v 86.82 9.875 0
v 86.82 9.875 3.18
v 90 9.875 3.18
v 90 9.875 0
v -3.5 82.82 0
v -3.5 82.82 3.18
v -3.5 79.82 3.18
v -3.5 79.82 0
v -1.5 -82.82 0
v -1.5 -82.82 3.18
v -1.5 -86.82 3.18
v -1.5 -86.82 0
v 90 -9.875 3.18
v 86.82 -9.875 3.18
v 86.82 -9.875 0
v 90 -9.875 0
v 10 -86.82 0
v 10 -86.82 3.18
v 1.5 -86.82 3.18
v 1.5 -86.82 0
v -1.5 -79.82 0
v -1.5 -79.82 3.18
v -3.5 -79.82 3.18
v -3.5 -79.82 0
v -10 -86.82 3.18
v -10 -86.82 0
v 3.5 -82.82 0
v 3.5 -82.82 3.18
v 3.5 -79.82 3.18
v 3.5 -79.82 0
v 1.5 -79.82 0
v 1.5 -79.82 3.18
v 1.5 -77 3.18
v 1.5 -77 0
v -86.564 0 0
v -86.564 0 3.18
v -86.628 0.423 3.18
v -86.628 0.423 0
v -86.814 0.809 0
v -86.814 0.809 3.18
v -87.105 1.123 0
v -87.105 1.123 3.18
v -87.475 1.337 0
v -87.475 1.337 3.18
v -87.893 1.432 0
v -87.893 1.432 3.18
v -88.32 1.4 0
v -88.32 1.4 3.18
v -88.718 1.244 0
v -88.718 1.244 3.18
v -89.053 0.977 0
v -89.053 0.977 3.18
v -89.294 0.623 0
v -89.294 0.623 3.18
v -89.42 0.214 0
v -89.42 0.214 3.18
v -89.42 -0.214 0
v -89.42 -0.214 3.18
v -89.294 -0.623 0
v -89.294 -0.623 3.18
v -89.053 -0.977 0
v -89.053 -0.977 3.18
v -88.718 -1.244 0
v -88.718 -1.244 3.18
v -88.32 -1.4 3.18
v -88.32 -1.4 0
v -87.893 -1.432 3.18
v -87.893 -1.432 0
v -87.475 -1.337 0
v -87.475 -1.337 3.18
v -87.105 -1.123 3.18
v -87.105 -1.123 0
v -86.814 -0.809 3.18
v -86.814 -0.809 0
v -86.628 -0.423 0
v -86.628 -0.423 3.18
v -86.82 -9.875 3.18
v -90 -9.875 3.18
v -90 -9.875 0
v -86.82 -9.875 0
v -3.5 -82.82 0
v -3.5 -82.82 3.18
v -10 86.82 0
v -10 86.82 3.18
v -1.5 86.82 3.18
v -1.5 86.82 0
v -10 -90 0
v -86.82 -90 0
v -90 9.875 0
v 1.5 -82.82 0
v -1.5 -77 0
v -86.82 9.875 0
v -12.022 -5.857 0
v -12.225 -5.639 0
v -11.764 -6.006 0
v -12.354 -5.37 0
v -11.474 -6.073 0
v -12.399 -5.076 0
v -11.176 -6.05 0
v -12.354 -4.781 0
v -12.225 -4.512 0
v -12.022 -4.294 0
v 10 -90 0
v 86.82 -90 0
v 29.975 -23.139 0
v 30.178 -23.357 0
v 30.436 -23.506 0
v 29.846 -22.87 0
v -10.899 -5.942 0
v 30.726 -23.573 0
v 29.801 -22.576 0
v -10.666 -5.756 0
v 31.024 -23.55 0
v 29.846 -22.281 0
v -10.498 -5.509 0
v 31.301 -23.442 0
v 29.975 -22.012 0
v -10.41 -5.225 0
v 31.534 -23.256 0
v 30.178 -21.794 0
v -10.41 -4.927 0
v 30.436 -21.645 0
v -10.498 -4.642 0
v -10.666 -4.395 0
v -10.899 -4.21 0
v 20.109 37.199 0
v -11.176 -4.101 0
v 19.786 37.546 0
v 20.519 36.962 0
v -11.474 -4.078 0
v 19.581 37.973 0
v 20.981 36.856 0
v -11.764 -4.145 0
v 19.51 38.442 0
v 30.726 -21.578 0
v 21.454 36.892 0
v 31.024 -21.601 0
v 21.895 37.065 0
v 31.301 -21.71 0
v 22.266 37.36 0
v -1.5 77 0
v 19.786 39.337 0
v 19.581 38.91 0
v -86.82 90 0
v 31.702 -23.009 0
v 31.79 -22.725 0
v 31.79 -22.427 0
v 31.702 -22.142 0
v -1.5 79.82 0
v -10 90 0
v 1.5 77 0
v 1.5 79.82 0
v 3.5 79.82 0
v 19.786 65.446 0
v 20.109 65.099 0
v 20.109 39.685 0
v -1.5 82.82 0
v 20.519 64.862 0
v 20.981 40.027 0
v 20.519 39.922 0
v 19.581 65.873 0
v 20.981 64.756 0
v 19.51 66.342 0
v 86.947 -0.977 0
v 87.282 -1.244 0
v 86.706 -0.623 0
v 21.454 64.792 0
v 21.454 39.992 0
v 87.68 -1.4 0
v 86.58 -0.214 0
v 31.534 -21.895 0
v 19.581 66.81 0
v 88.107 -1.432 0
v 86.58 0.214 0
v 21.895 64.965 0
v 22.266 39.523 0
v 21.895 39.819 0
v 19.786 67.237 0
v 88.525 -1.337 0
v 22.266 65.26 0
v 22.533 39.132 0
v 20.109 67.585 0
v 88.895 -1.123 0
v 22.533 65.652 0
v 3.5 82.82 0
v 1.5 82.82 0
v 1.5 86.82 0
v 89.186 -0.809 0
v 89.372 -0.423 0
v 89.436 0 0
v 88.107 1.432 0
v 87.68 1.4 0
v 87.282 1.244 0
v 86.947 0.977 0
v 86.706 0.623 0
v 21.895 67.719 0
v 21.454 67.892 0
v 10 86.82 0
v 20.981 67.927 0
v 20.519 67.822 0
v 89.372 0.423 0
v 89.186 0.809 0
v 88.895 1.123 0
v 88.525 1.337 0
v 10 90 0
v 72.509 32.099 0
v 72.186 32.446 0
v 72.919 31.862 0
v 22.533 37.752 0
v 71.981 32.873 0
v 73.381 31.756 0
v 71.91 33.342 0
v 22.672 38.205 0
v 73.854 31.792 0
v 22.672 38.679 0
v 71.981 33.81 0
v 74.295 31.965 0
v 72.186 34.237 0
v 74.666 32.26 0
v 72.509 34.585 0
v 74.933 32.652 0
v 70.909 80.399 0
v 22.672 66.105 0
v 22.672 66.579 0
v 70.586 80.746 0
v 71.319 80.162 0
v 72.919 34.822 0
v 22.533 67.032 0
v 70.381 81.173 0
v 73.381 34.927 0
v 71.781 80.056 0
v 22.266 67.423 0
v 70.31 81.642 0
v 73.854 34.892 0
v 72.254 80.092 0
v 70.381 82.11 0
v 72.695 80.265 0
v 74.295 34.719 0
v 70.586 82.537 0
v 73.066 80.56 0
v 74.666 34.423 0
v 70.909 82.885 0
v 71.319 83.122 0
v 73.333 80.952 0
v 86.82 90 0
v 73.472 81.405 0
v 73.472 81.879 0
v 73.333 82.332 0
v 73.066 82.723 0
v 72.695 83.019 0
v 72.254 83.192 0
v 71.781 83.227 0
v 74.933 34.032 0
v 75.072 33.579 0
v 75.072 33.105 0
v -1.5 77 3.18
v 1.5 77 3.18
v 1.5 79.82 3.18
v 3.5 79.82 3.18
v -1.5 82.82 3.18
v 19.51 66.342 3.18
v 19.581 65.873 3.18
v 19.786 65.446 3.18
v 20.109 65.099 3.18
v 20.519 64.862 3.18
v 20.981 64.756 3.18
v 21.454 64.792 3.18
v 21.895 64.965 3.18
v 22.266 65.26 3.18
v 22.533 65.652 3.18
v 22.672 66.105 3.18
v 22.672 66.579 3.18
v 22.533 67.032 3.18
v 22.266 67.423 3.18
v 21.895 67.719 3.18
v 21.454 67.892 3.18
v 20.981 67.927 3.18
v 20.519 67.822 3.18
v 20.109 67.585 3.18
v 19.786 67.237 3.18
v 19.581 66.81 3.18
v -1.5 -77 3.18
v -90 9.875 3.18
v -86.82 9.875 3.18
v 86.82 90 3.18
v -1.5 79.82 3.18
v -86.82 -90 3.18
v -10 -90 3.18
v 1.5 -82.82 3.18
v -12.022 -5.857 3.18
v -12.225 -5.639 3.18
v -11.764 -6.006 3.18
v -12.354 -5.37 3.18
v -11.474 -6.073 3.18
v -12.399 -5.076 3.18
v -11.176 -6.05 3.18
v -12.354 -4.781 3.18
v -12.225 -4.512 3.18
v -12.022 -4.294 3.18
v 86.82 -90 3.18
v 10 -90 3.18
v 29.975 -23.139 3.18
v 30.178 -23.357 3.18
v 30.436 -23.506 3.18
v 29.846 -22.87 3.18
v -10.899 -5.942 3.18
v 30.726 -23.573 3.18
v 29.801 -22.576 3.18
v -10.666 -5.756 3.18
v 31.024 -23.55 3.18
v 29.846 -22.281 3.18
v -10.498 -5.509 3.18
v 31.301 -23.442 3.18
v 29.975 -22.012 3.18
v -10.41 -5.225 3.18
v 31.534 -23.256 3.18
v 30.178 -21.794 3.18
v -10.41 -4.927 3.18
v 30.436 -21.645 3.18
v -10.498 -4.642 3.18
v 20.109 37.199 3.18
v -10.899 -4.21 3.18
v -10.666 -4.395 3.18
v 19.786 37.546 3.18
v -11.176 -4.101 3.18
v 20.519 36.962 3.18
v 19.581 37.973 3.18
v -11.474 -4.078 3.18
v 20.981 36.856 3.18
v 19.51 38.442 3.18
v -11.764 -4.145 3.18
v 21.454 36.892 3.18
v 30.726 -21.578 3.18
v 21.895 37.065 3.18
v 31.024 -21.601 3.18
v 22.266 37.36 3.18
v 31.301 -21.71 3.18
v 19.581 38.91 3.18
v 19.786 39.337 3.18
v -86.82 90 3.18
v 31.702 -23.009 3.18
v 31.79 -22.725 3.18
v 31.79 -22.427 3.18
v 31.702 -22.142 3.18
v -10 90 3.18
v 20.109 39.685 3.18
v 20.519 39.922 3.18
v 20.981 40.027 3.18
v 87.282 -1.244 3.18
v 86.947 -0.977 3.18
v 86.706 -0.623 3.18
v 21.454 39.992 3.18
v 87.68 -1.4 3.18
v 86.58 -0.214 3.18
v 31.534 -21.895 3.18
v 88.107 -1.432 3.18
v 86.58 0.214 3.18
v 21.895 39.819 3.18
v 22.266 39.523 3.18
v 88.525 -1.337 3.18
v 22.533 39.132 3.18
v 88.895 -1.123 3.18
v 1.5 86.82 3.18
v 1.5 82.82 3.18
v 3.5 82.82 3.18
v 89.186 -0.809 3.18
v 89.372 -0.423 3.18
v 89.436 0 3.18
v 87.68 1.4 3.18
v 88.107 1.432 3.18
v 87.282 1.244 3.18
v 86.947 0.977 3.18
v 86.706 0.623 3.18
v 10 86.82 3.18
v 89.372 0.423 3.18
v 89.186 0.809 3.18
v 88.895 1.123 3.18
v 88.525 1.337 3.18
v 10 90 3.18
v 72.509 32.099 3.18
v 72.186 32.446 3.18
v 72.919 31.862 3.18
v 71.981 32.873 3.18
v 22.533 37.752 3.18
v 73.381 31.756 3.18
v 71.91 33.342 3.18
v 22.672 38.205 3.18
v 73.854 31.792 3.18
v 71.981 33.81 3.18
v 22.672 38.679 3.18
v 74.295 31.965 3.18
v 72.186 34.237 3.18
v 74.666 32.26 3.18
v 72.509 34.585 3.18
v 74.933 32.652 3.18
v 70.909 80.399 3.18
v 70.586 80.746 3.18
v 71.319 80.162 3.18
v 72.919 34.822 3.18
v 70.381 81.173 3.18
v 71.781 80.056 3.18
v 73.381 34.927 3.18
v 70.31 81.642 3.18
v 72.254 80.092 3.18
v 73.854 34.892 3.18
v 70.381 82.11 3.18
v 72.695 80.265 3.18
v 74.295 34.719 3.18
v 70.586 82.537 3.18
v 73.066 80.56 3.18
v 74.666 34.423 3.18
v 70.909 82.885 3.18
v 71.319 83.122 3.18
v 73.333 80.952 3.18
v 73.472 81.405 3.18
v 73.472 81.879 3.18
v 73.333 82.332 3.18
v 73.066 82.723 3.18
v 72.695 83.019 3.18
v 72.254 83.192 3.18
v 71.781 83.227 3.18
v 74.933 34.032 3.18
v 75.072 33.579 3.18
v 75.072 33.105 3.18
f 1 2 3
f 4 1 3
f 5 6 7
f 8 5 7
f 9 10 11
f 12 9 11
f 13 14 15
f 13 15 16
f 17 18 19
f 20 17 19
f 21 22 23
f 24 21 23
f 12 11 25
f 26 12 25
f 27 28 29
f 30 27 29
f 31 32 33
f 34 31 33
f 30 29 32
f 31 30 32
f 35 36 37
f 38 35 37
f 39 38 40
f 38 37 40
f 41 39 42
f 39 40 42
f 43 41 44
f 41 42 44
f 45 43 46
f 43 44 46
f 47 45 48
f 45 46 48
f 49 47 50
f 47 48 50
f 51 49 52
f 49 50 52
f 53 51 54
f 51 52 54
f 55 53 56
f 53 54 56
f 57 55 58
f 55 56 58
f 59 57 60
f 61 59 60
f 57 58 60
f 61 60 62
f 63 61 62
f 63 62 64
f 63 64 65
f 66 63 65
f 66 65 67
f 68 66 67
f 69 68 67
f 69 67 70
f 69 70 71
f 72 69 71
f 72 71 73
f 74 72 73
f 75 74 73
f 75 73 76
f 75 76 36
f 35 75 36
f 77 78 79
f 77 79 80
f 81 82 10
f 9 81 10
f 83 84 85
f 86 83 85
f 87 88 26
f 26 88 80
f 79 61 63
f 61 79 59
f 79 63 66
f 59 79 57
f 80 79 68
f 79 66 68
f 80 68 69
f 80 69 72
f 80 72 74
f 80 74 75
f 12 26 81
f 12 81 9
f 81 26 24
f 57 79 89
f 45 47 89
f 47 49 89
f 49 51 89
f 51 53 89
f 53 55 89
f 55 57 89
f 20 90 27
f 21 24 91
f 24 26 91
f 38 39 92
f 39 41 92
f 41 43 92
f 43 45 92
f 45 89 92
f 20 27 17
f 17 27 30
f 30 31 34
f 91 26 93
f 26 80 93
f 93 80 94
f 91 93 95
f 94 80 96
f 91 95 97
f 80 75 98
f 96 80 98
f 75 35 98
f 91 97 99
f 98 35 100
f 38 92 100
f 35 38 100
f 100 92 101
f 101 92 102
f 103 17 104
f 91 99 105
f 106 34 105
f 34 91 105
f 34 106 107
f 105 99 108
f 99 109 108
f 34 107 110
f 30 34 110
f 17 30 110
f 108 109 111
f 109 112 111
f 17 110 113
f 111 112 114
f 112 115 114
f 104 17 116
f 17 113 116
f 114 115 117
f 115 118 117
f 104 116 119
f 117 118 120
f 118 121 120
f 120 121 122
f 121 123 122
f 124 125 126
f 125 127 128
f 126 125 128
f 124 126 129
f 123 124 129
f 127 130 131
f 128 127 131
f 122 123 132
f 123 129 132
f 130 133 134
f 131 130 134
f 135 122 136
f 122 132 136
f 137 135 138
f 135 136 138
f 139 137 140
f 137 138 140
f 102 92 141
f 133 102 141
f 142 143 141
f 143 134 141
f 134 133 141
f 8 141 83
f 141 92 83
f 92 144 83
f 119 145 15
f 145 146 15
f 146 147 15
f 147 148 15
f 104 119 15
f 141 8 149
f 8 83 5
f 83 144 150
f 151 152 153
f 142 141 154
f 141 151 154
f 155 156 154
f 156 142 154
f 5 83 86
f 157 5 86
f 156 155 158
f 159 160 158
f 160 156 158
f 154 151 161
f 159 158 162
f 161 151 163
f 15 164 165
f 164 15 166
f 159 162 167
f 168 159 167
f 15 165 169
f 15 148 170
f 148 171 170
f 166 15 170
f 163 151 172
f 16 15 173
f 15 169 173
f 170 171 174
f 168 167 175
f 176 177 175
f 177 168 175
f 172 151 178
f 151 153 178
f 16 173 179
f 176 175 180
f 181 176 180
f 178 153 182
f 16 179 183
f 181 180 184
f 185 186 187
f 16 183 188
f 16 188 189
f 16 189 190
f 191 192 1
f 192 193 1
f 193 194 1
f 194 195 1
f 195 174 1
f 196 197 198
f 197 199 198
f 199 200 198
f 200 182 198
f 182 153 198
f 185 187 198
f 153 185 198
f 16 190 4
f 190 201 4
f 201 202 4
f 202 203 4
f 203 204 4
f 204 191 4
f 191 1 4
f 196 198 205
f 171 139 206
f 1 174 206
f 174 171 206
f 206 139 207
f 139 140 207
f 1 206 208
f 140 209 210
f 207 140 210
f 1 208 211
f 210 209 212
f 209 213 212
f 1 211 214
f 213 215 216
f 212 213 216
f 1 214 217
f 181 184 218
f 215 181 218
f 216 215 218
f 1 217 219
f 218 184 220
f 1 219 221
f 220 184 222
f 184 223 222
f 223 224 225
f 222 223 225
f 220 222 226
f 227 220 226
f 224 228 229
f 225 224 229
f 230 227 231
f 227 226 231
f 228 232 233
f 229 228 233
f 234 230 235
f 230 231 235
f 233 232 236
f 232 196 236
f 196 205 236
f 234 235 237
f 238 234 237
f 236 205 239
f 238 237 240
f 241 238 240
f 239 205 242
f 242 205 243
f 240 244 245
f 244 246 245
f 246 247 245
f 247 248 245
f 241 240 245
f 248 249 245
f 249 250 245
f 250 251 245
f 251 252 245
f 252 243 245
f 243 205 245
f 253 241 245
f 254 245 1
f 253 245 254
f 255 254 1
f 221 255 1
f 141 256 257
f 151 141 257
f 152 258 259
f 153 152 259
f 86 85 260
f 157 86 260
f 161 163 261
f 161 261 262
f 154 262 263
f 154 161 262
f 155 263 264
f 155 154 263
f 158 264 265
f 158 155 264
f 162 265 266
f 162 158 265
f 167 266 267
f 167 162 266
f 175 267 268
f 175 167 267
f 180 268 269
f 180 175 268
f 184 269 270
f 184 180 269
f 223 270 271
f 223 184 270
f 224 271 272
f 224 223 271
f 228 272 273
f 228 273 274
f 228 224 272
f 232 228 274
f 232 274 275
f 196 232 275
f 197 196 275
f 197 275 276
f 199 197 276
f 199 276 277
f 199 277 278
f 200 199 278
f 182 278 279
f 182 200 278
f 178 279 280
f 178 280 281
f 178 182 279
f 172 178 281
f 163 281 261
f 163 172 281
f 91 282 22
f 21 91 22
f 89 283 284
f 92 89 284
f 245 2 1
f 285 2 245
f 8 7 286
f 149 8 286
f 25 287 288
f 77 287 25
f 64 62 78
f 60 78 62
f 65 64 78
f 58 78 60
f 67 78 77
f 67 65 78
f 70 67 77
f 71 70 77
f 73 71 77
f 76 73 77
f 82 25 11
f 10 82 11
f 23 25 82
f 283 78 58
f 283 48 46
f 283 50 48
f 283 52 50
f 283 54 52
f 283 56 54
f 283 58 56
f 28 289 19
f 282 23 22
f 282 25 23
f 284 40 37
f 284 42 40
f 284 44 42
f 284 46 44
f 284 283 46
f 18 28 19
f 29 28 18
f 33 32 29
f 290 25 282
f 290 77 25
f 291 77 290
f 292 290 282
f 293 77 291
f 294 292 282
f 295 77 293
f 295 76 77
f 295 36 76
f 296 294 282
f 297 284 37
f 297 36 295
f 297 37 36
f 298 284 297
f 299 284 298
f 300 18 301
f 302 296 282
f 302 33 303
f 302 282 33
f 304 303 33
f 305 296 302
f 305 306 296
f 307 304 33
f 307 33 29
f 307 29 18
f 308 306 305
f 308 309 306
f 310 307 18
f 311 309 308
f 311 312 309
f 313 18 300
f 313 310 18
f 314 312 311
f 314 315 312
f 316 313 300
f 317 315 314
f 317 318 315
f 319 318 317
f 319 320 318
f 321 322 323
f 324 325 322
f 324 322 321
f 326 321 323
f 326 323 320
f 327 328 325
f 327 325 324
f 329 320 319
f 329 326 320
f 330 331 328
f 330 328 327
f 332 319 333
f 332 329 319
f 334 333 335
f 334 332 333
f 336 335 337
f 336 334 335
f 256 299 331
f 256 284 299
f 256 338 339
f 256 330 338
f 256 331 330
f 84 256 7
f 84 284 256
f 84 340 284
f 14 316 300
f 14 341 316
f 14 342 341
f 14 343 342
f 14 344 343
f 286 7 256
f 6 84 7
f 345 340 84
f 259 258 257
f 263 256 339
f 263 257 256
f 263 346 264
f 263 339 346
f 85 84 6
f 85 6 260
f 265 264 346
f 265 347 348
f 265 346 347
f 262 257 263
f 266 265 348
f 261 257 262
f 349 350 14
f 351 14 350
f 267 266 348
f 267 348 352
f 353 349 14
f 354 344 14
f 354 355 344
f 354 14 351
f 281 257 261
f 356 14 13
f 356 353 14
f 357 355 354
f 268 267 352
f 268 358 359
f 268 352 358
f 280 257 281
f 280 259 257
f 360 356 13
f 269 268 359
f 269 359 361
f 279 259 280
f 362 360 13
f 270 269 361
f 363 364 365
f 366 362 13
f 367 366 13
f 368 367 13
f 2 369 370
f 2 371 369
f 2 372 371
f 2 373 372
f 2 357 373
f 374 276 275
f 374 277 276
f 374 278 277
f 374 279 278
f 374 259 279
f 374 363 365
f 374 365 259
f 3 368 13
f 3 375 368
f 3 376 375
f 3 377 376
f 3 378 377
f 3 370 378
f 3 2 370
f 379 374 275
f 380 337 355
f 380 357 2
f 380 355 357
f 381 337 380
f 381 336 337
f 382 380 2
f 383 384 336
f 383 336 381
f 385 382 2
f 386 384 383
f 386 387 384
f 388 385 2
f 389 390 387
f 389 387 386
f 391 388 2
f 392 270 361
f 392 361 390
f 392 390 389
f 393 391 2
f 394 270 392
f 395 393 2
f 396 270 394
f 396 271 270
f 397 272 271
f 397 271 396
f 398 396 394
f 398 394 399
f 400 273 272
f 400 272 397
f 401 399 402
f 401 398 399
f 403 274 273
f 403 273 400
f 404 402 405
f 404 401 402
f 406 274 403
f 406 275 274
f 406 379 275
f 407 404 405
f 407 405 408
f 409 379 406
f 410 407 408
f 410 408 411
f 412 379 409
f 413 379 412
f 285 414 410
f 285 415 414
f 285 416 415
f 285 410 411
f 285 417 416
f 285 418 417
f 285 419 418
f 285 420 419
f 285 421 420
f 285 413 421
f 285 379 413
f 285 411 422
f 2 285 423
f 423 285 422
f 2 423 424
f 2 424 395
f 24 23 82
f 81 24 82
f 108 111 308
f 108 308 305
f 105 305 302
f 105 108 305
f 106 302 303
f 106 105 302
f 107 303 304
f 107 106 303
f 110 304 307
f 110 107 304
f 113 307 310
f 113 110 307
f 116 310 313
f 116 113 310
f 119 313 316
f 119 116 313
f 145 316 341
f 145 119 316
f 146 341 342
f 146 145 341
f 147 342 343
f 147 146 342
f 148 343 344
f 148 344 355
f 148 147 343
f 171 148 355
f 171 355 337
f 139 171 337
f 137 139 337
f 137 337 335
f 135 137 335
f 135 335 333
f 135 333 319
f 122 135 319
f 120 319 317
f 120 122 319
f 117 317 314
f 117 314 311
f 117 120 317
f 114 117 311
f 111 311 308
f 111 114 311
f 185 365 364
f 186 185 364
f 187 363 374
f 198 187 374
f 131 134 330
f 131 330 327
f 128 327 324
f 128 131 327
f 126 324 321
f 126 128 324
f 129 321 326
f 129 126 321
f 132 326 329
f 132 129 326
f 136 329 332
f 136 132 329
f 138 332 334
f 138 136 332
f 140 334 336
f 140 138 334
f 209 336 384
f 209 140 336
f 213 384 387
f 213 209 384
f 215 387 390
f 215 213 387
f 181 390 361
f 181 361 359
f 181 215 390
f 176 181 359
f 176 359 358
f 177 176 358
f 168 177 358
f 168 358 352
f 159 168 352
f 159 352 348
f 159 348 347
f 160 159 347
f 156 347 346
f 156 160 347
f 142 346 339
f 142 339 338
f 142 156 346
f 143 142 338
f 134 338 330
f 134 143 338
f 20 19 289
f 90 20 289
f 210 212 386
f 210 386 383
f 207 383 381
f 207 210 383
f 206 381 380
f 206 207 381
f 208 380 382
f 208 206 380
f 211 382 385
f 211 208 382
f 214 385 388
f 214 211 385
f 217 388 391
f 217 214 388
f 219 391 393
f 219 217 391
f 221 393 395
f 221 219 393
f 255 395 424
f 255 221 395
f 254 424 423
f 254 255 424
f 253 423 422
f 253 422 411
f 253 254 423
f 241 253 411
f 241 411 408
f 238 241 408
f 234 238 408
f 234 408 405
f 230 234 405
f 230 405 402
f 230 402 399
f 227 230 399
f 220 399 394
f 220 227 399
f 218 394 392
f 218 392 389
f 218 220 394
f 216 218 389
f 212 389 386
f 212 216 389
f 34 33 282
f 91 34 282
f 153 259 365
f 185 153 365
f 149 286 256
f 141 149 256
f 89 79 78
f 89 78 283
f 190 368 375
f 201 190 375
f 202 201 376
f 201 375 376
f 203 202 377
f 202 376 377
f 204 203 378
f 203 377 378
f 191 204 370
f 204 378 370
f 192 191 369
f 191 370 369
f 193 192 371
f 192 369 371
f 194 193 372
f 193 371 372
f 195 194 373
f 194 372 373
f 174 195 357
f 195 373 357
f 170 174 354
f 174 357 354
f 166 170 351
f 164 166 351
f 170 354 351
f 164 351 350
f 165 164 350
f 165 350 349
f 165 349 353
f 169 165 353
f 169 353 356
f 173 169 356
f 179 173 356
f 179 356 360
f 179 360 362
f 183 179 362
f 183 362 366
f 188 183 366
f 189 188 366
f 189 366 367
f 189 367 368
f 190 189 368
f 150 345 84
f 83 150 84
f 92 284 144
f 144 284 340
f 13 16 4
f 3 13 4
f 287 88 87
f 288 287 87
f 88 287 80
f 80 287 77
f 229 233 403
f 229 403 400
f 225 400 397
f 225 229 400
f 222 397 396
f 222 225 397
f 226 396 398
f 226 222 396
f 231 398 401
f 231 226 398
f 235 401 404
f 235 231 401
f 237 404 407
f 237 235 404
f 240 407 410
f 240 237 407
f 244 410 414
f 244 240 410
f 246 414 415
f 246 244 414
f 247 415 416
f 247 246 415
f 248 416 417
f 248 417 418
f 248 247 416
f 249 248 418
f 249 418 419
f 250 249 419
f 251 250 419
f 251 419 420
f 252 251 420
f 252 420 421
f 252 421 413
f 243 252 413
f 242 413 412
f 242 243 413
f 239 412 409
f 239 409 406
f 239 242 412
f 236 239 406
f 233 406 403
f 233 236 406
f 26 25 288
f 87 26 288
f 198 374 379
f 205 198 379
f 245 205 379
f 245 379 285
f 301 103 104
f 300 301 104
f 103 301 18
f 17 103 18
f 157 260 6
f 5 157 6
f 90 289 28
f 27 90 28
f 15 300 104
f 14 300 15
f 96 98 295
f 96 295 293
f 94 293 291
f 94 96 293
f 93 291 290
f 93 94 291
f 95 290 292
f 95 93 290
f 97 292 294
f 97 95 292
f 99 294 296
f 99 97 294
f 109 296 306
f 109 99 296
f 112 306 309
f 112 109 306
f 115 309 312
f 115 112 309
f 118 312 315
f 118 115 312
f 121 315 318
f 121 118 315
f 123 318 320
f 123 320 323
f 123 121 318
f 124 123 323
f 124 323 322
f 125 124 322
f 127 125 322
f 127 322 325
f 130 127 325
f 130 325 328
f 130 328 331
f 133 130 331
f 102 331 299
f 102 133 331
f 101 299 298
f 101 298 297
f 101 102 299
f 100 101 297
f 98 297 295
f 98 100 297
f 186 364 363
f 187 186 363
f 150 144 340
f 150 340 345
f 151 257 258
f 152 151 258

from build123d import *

# Parameters (mm, degrees)
SKETCH3_W           = 180
SKETCH3_H           = 180
SKETCH3_R           = 1
SKETCH3_R_2         = 1.59
BOSS_EXTRUDE1_DEPTH = 3.18
CUT_EXTRUDE1_DEPTH  = 128.318939675
SKETCH5_R           = 1.436023081
SKETCH5_W           = 3.18
SKETCH5_H           = 80.125
CUT_EXTRUDE2_DEPTH  = 128.318939675


with BuildPart() as part:
    # Sketch3 → Boss-Extrude1 (new body)
    with BuildSketch(Plane.XY):
        Rectangle(SKETCH3_W, SKETCH3_H)
        with Locations(Location((-11.39889268, -5.07556396, 0), (0, 0, 180))):
            Circle(SKETCH3_R, mode=Mode.SUBTRACT)
        with Locations(Location((30.80110732, -22.57556396, 0), (0, 0, 180))):
            Circle(SKETCH3_R, mode=Mode.SUBTRACT)
        with Locations(Location((73.5, 33.341660125, 0), (0, 0, 180))):
            Circle(SKETCH3_R_2, mode=Mode.SUBTRACT)
        with Locations(Location((21.1, 38.441660125, 0), (0, 0, 180))):
            Circle(SKETCH3_R_2, mode=Mode.SUBTRACT)
        with Locations(Location((21.1, 66.341660125, 0), (0, 0, 180))):
            Circle(SKETCH3_R_2, mode=Mode.SUBTRACT)
        with Locations(Location((71.9, 81.641660125, 0), (0, 0, 180))):
            Circle(SKETCH3_R_2, mode=Mode.SUBTRACT)
    extrude(amount=BOSS_EXTRUDE1_DEPTH)

    # Sketch4 → Cut-Extrude1 (cut, through all)
    with BuildSketch(Plane.XY.offset(3.18)):
        Polygon((1.5, 86.82), (10, 86.82), (10, 90), (-10, 90), (-10, 86.82), (-1.5, 86.82), (-1.5, 82.82), (-3.5, 82.82), (-3.5, 79.82), (-1.5, 79.82), (-1.5, 77), (1.5, 77), (1.5, 79.82), (3.5, 79.82), (3.5, 82.82), (1.5, 82.82), align=None)
        Polygon((1.5, -79.82), (1.5, -77), (-1.5, -77), (-1.5, -79.82), (-3.5, -79.82), (-3.5, -82.82), (-1.5, -82.82), (-1.5, -86.82), (-10, -86.82), (-10, -90), (10, -90), (10, -86.82), (1.5, -86.82), (1.5, -82.82), (3.5, -82.82), (3.5, -79.82), align=None)
    extrude(amount=-CUT_EXTRUDE1_DEPTH, mode=Mode.SUBTRACT)

    # Sketch5 → Cut-Extrude2 (cut, through all)
    with BuildSketch(Plane.XY.offset(3.18)):
        with Locations((-88, 0)):
            Circle(SKETCH5_R)
        with Locations((88, 0)):
            Circle(SKETCH5_R)
        with Locations((-88.41, 49.9375)):
            Rectangle(SKETCH5_W, SKETCH5_H)
        with Locations((-88.41, -49.9375)):
            Rectangle(SKETCH5_W, SKETCH5_H)
        with Locations((88.41, -49.9375)):
            Rectangle(SKETCH5_W, SKETCH5_H)
        with Locations((88.41, 49.9375)):
            Rectangle(SKETCH5_W, SKETCH5_H)
    extrude(amount=-CUT_EXTRUDE2_DEPTH, mode=Mode.SUBTRACT)


solid = part.part
